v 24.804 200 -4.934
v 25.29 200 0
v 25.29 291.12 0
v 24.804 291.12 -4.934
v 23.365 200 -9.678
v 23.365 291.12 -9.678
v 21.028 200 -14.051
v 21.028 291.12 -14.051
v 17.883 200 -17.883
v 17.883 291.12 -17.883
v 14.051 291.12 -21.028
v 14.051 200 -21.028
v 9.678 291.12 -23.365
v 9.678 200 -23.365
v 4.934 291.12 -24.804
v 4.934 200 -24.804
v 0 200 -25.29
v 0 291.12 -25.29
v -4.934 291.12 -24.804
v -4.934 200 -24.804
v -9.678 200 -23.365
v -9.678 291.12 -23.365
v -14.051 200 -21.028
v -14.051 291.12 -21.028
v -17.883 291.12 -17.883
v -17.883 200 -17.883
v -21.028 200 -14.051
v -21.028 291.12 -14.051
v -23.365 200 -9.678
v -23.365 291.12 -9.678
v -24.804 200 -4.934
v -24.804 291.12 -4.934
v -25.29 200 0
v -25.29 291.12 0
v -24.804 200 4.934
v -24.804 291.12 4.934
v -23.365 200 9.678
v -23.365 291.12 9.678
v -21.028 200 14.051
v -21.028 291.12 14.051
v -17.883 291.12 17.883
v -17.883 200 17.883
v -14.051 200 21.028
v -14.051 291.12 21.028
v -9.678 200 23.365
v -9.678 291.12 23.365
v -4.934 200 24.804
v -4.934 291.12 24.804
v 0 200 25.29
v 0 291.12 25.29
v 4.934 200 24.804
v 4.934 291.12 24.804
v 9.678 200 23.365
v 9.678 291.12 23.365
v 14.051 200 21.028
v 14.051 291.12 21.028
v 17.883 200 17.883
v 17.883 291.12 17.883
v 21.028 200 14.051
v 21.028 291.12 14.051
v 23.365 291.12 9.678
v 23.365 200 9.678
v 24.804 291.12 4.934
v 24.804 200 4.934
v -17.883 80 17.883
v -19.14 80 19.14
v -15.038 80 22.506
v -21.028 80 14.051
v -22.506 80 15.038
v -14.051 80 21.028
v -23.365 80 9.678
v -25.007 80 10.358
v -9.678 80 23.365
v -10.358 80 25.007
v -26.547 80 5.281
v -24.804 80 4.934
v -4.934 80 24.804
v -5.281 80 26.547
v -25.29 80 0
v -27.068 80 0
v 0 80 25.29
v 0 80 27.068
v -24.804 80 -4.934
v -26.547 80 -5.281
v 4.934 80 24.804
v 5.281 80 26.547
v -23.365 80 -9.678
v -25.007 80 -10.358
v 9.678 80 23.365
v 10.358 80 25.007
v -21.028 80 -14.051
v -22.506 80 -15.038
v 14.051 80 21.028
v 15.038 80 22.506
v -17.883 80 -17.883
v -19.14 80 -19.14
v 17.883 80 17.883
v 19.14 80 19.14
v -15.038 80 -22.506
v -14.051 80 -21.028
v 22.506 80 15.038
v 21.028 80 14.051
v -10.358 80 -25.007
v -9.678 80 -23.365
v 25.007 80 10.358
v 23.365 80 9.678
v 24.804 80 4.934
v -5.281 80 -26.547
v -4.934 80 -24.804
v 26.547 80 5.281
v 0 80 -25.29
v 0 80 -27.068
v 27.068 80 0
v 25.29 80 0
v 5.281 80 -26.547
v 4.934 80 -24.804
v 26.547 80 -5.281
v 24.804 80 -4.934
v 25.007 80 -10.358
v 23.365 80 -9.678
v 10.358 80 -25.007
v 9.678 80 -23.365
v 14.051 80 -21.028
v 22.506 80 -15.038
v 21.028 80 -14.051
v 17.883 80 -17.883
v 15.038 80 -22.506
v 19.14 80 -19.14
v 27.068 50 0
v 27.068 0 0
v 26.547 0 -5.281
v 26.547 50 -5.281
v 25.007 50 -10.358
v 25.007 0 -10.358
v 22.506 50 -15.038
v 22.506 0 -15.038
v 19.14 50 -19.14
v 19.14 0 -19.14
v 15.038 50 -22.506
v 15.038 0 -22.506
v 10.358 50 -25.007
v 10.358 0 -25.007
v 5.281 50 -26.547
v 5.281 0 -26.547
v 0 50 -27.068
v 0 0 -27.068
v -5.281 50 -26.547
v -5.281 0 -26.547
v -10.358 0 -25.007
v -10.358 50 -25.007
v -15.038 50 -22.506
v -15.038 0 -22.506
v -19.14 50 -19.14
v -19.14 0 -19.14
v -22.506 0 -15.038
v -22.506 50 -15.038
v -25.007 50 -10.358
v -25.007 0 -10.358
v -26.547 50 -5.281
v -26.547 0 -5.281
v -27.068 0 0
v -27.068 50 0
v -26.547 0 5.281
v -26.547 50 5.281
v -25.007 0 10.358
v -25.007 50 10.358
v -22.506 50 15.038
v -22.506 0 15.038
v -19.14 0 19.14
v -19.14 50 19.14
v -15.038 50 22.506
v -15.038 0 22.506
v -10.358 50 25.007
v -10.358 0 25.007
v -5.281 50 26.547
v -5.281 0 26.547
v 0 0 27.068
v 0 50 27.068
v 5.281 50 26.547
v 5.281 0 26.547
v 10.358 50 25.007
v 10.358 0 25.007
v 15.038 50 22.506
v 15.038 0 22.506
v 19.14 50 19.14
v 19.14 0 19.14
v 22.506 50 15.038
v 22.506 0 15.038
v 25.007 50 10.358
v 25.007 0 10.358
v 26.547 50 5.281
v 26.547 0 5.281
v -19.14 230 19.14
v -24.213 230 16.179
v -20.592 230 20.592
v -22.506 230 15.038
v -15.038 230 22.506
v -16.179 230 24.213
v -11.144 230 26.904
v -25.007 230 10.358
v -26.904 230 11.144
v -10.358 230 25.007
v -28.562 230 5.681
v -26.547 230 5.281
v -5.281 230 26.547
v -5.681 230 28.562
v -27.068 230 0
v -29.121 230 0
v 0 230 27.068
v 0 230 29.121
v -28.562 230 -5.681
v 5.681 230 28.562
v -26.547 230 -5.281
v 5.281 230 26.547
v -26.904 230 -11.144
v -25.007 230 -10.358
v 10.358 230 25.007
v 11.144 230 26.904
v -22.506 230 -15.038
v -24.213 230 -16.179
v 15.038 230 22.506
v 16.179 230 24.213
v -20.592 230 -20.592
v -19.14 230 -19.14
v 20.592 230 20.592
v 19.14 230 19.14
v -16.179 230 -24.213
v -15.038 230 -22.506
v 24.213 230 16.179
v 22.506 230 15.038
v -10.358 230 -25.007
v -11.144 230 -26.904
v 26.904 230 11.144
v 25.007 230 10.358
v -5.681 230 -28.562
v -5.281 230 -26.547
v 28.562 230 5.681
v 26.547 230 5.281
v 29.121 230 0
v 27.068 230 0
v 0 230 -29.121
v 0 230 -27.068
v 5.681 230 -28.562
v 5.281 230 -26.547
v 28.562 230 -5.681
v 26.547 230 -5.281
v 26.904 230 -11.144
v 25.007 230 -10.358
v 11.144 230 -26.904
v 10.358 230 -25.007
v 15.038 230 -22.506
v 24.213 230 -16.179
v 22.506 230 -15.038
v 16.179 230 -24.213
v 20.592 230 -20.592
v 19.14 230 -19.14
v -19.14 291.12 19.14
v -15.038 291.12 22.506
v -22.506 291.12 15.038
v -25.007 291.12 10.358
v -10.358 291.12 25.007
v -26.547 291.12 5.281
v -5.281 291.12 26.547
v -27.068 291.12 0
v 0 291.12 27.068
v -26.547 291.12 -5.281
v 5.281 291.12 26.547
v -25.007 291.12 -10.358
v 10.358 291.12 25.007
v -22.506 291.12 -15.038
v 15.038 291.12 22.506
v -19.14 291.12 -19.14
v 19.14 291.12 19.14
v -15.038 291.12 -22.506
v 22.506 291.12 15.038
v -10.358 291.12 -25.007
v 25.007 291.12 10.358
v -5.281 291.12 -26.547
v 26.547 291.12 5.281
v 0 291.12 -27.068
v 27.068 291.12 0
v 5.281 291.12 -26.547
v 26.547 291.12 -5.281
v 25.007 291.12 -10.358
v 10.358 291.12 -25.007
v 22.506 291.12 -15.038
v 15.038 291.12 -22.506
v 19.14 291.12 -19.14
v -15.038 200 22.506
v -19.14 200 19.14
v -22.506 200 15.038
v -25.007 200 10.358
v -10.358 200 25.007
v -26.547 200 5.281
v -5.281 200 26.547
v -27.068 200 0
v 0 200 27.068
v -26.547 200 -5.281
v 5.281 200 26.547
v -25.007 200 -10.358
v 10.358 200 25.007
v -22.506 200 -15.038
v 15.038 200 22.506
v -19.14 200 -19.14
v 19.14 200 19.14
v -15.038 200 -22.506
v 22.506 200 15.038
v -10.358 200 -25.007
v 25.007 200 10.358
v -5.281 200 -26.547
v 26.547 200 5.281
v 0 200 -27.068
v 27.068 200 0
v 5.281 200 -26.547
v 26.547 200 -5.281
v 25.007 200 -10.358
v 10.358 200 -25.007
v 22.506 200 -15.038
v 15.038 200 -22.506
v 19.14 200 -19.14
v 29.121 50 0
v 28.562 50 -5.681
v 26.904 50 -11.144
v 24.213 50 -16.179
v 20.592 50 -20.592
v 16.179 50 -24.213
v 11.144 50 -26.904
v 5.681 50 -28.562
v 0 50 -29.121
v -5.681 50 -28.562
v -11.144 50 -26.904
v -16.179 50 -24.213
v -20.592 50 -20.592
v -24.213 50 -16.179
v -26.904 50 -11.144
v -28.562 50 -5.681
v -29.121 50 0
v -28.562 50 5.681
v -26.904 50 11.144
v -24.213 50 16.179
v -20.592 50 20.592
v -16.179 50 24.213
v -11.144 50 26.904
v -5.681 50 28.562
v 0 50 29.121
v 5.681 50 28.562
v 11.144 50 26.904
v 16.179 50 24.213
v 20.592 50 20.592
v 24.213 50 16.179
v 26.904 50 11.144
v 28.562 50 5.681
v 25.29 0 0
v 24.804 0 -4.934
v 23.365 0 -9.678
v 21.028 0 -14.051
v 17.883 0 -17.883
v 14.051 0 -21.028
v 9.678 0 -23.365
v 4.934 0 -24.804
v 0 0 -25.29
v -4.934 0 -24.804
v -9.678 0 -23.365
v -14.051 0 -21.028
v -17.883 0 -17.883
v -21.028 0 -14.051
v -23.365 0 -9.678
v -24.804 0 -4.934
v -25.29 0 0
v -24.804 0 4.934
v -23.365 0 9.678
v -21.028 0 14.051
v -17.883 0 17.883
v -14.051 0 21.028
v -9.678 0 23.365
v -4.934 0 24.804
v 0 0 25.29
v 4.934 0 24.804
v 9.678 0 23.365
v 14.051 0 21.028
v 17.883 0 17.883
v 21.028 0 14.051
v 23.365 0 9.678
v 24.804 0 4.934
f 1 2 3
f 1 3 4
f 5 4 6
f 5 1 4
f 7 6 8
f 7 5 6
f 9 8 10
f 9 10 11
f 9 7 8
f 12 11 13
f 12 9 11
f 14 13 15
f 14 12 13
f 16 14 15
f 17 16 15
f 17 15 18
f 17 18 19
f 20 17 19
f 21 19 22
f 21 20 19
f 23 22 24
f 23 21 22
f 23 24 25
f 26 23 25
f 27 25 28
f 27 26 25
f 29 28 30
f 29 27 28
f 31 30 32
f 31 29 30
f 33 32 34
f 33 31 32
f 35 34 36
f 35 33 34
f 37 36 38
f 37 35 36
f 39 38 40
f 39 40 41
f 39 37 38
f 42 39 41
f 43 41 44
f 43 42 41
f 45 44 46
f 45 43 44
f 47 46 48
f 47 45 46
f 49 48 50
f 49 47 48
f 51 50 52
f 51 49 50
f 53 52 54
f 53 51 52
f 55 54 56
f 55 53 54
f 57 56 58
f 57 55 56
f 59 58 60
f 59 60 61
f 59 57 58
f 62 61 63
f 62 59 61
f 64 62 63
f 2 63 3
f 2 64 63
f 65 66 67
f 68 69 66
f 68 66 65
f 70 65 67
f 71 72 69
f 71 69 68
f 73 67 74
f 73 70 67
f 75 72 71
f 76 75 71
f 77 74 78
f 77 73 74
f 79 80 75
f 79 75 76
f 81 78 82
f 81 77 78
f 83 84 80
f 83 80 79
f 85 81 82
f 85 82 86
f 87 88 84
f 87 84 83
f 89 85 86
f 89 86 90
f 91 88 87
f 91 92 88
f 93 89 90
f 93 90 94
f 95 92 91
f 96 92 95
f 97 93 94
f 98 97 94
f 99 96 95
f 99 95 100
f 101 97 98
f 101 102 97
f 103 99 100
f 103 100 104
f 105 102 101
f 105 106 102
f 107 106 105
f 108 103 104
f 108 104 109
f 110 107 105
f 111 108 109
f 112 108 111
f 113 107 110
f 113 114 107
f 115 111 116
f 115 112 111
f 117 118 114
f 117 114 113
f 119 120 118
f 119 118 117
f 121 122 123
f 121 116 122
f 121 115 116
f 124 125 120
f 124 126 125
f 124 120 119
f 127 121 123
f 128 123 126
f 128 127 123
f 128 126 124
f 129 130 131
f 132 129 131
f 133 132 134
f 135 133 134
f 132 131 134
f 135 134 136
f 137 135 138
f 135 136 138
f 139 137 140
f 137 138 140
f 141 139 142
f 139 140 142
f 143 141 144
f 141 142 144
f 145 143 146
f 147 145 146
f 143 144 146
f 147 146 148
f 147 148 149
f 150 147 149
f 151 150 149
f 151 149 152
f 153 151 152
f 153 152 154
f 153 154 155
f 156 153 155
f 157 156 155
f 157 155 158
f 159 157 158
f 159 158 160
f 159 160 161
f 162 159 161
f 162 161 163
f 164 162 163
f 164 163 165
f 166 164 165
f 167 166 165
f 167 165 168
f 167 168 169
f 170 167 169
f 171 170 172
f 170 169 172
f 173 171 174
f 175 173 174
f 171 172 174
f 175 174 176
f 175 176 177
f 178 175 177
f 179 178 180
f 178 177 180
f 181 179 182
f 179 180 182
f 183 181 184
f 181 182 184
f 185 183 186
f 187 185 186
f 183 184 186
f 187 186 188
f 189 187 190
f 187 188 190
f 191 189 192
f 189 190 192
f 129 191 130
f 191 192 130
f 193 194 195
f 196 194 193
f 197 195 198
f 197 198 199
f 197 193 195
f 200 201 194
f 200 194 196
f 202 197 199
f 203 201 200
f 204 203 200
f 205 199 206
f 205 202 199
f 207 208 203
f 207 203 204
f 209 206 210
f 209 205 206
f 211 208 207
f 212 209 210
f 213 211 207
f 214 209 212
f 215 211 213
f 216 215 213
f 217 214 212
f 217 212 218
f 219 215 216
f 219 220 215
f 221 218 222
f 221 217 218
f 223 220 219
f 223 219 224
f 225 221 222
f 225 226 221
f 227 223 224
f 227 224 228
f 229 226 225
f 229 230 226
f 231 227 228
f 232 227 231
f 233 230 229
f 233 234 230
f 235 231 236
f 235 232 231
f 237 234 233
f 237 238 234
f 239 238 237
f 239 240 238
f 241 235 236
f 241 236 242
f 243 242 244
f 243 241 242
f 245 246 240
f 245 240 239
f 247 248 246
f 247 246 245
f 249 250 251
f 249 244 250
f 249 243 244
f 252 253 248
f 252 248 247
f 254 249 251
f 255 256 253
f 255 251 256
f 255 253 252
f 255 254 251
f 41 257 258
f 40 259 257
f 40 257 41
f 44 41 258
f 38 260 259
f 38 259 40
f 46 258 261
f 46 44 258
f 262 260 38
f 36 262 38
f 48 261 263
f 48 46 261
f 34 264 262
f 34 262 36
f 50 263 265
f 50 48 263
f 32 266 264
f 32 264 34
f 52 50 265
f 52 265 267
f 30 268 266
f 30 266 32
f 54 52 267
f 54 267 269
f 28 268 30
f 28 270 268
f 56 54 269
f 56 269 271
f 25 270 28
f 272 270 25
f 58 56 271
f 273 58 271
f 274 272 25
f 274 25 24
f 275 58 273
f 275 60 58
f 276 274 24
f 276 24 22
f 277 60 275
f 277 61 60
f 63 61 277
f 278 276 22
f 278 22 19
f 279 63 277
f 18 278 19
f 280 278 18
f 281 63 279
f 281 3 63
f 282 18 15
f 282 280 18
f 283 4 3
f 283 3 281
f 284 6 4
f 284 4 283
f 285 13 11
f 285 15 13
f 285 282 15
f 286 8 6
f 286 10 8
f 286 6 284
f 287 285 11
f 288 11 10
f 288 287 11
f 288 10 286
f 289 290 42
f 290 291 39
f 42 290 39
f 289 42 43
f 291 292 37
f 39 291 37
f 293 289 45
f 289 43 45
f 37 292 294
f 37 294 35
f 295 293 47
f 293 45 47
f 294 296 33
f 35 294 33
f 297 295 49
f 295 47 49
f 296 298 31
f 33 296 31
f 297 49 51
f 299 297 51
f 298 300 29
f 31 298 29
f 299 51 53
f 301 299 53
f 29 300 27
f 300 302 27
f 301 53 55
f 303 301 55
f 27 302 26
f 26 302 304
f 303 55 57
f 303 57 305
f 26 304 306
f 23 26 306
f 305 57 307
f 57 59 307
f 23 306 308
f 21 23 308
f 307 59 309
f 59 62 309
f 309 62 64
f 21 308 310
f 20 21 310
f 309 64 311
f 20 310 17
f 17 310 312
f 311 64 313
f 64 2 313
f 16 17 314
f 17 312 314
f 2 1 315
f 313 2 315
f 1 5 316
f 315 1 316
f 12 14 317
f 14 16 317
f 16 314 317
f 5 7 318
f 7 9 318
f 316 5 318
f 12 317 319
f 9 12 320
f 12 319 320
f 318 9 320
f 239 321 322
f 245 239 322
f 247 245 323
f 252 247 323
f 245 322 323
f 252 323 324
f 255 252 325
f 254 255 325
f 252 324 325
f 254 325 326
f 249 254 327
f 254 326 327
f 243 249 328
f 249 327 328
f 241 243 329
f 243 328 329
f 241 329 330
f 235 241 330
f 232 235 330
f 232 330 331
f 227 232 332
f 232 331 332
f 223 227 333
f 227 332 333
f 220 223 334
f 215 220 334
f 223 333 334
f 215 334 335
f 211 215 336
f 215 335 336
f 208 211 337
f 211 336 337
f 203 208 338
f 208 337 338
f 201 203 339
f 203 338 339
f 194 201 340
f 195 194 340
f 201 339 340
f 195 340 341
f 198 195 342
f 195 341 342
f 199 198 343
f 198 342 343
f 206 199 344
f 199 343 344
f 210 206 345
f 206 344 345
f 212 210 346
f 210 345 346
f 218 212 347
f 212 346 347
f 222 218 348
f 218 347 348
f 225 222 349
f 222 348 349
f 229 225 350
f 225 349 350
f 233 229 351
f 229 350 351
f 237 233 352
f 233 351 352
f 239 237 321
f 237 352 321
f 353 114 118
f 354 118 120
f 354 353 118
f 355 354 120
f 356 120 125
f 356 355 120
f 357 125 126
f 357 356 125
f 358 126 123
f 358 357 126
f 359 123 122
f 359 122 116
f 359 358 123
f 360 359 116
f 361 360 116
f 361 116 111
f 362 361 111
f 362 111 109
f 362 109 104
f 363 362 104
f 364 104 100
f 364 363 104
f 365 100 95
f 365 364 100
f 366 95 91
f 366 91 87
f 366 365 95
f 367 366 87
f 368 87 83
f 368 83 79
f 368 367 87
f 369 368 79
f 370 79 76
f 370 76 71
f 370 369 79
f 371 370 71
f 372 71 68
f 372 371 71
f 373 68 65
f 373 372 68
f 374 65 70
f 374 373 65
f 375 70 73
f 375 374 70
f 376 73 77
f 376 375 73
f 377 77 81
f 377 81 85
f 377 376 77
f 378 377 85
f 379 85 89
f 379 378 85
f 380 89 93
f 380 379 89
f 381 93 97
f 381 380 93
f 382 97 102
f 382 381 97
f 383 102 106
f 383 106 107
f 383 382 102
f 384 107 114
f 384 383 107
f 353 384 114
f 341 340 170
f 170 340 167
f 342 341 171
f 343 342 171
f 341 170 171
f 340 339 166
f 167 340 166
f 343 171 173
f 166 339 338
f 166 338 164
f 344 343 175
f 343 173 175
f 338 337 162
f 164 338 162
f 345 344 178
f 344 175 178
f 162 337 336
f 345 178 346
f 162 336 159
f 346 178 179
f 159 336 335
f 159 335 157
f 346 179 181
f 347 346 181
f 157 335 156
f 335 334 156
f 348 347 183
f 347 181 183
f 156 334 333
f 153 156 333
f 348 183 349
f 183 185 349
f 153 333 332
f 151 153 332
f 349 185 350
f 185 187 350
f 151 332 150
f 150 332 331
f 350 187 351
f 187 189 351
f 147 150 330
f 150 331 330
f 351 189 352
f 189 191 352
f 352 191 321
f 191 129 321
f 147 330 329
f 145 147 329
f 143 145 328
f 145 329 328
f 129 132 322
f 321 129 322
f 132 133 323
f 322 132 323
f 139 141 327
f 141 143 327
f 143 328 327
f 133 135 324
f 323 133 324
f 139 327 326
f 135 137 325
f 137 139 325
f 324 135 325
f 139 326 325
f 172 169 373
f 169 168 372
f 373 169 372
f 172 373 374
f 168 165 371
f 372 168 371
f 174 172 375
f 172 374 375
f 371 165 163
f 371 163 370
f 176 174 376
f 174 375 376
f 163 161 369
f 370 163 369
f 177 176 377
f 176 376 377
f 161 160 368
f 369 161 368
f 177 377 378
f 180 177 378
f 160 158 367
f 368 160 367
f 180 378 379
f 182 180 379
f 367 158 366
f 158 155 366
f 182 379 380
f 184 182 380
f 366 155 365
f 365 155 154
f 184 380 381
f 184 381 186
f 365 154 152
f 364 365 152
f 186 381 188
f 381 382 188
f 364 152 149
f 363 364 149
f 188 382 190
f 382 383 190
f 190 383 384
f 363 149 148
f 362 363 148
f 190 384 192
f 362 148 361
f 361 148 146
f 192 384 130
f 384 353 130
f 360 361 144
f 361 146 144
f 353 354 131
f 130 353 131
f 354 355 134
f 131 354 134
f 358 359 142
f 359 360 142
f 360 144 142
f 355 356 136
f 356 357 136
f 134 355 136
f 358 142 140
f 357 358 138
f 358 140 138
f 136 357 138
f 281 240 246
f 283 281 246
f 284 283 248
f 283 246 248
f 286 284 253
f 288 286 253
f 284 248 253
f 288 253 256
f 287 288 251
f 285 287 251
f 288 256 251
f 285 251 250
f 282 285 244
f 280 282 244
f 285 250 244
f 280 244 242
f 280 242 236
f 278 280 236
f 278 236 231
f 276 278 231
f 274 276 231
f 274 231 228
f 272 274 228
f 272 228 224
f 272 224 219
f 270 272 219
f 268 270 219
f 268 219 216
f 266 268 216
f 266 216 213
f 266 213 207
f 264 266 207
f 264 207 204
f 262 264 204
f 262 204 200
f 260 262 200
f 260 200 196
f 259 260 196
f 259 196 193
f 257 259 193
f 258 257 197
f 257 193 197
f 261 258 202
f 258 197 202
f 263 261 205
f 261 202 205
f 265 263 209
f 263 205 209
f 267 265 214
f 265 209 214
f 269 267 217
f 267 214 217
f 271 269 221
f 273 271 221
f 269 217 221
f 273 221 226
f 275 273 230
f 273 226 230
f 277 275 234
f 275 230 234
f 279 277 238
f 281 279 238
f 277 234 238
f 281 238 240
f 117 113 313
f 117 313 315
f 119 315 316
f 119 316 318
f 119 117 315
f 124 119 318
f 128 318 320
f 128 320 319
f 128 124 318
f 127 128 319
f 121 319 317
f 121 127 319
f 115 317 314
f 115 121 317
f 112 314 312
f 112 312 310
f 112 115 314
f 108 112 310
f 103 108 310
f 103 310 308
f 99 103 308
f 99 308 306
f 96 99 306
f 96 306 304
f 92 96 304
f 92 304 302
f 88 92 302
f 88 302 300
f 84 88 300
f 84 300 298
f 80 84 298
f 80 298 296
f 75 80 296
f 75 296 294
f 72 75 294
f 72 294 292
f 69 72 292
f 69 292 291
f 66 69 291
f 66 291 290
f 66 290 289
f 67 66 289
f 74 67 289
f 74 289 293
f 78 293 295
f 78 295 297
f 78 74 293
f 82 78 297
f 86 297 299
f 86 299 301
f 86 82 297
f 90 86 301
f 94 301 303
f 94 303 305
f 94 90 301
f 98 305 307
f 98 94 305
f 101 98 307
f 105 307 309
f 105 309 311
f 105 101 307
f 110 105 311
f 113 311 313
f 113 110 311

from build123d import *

# Parameters (mm, degrees)
DRIVER_R            = 27.06751
DRIVER_R_2          = 25.29025
BOSS_EXTRUDE1_DEPTH = 80
BOSS_EXTRUDE2_START = 50
DRIVER_3_R          = 29.1211
DRIVER_3_R_2        = 27.06751
BOSS_EXTRUDE2_DEPTH = 180
BOSS_EXTRUDE3_START = 200
DRIVER_4_R          = 27.06751
DRIVER_4_R_2        = 25.29025
BOSS_EXTRUDE3_DEPTH = 91.12


with BuildPart() as part:
    # driver → Boss-Extrude1 (new body)
    with BuildSketch(Plane(origin=(0, 0, 0), x_dir=(1, 0, 0), z_dir=(0, 1, 0))):
        Circle(DRIVER_R)
        Circle(DRIVER_R_2, mode=Mode.SUBTRACT)
    extrude(amount=BOSS_EXTRUDE1_DEPTH)

    # driver<3> → Boss-Extrude2 (add)
    with BuildSketch(Plane(origin=(0, 0, 0), x_dir=(1, 0, 0), z_dir=(0, 1, 0)).offset(BOSS_EXTRUDE2_START)):
        Circle(DRIVER_3_R)
        Circle(DRIVER_3_R_2, mode=Mode.SUBTRACT)
    extrude(amount=BOSS_EXTRUDE2_DEPTH)

    # driver<4> → Boss-Extrude3 (add)
    with BuildSketch(Plane(origin=(0, 0, 0), x_dir=(1, 0, 0), z_dir=(0, 1, 0)).offset(BOSS_EXTRUDE3_START)):
        Circle(DRIVER_4_R)
        Circle(DRIVER_4_R_2, mode=Mode.SUBTRACT)
    extrude(amount=BOSS_EXTRUDE3_DEPTH)


solid = part.part
